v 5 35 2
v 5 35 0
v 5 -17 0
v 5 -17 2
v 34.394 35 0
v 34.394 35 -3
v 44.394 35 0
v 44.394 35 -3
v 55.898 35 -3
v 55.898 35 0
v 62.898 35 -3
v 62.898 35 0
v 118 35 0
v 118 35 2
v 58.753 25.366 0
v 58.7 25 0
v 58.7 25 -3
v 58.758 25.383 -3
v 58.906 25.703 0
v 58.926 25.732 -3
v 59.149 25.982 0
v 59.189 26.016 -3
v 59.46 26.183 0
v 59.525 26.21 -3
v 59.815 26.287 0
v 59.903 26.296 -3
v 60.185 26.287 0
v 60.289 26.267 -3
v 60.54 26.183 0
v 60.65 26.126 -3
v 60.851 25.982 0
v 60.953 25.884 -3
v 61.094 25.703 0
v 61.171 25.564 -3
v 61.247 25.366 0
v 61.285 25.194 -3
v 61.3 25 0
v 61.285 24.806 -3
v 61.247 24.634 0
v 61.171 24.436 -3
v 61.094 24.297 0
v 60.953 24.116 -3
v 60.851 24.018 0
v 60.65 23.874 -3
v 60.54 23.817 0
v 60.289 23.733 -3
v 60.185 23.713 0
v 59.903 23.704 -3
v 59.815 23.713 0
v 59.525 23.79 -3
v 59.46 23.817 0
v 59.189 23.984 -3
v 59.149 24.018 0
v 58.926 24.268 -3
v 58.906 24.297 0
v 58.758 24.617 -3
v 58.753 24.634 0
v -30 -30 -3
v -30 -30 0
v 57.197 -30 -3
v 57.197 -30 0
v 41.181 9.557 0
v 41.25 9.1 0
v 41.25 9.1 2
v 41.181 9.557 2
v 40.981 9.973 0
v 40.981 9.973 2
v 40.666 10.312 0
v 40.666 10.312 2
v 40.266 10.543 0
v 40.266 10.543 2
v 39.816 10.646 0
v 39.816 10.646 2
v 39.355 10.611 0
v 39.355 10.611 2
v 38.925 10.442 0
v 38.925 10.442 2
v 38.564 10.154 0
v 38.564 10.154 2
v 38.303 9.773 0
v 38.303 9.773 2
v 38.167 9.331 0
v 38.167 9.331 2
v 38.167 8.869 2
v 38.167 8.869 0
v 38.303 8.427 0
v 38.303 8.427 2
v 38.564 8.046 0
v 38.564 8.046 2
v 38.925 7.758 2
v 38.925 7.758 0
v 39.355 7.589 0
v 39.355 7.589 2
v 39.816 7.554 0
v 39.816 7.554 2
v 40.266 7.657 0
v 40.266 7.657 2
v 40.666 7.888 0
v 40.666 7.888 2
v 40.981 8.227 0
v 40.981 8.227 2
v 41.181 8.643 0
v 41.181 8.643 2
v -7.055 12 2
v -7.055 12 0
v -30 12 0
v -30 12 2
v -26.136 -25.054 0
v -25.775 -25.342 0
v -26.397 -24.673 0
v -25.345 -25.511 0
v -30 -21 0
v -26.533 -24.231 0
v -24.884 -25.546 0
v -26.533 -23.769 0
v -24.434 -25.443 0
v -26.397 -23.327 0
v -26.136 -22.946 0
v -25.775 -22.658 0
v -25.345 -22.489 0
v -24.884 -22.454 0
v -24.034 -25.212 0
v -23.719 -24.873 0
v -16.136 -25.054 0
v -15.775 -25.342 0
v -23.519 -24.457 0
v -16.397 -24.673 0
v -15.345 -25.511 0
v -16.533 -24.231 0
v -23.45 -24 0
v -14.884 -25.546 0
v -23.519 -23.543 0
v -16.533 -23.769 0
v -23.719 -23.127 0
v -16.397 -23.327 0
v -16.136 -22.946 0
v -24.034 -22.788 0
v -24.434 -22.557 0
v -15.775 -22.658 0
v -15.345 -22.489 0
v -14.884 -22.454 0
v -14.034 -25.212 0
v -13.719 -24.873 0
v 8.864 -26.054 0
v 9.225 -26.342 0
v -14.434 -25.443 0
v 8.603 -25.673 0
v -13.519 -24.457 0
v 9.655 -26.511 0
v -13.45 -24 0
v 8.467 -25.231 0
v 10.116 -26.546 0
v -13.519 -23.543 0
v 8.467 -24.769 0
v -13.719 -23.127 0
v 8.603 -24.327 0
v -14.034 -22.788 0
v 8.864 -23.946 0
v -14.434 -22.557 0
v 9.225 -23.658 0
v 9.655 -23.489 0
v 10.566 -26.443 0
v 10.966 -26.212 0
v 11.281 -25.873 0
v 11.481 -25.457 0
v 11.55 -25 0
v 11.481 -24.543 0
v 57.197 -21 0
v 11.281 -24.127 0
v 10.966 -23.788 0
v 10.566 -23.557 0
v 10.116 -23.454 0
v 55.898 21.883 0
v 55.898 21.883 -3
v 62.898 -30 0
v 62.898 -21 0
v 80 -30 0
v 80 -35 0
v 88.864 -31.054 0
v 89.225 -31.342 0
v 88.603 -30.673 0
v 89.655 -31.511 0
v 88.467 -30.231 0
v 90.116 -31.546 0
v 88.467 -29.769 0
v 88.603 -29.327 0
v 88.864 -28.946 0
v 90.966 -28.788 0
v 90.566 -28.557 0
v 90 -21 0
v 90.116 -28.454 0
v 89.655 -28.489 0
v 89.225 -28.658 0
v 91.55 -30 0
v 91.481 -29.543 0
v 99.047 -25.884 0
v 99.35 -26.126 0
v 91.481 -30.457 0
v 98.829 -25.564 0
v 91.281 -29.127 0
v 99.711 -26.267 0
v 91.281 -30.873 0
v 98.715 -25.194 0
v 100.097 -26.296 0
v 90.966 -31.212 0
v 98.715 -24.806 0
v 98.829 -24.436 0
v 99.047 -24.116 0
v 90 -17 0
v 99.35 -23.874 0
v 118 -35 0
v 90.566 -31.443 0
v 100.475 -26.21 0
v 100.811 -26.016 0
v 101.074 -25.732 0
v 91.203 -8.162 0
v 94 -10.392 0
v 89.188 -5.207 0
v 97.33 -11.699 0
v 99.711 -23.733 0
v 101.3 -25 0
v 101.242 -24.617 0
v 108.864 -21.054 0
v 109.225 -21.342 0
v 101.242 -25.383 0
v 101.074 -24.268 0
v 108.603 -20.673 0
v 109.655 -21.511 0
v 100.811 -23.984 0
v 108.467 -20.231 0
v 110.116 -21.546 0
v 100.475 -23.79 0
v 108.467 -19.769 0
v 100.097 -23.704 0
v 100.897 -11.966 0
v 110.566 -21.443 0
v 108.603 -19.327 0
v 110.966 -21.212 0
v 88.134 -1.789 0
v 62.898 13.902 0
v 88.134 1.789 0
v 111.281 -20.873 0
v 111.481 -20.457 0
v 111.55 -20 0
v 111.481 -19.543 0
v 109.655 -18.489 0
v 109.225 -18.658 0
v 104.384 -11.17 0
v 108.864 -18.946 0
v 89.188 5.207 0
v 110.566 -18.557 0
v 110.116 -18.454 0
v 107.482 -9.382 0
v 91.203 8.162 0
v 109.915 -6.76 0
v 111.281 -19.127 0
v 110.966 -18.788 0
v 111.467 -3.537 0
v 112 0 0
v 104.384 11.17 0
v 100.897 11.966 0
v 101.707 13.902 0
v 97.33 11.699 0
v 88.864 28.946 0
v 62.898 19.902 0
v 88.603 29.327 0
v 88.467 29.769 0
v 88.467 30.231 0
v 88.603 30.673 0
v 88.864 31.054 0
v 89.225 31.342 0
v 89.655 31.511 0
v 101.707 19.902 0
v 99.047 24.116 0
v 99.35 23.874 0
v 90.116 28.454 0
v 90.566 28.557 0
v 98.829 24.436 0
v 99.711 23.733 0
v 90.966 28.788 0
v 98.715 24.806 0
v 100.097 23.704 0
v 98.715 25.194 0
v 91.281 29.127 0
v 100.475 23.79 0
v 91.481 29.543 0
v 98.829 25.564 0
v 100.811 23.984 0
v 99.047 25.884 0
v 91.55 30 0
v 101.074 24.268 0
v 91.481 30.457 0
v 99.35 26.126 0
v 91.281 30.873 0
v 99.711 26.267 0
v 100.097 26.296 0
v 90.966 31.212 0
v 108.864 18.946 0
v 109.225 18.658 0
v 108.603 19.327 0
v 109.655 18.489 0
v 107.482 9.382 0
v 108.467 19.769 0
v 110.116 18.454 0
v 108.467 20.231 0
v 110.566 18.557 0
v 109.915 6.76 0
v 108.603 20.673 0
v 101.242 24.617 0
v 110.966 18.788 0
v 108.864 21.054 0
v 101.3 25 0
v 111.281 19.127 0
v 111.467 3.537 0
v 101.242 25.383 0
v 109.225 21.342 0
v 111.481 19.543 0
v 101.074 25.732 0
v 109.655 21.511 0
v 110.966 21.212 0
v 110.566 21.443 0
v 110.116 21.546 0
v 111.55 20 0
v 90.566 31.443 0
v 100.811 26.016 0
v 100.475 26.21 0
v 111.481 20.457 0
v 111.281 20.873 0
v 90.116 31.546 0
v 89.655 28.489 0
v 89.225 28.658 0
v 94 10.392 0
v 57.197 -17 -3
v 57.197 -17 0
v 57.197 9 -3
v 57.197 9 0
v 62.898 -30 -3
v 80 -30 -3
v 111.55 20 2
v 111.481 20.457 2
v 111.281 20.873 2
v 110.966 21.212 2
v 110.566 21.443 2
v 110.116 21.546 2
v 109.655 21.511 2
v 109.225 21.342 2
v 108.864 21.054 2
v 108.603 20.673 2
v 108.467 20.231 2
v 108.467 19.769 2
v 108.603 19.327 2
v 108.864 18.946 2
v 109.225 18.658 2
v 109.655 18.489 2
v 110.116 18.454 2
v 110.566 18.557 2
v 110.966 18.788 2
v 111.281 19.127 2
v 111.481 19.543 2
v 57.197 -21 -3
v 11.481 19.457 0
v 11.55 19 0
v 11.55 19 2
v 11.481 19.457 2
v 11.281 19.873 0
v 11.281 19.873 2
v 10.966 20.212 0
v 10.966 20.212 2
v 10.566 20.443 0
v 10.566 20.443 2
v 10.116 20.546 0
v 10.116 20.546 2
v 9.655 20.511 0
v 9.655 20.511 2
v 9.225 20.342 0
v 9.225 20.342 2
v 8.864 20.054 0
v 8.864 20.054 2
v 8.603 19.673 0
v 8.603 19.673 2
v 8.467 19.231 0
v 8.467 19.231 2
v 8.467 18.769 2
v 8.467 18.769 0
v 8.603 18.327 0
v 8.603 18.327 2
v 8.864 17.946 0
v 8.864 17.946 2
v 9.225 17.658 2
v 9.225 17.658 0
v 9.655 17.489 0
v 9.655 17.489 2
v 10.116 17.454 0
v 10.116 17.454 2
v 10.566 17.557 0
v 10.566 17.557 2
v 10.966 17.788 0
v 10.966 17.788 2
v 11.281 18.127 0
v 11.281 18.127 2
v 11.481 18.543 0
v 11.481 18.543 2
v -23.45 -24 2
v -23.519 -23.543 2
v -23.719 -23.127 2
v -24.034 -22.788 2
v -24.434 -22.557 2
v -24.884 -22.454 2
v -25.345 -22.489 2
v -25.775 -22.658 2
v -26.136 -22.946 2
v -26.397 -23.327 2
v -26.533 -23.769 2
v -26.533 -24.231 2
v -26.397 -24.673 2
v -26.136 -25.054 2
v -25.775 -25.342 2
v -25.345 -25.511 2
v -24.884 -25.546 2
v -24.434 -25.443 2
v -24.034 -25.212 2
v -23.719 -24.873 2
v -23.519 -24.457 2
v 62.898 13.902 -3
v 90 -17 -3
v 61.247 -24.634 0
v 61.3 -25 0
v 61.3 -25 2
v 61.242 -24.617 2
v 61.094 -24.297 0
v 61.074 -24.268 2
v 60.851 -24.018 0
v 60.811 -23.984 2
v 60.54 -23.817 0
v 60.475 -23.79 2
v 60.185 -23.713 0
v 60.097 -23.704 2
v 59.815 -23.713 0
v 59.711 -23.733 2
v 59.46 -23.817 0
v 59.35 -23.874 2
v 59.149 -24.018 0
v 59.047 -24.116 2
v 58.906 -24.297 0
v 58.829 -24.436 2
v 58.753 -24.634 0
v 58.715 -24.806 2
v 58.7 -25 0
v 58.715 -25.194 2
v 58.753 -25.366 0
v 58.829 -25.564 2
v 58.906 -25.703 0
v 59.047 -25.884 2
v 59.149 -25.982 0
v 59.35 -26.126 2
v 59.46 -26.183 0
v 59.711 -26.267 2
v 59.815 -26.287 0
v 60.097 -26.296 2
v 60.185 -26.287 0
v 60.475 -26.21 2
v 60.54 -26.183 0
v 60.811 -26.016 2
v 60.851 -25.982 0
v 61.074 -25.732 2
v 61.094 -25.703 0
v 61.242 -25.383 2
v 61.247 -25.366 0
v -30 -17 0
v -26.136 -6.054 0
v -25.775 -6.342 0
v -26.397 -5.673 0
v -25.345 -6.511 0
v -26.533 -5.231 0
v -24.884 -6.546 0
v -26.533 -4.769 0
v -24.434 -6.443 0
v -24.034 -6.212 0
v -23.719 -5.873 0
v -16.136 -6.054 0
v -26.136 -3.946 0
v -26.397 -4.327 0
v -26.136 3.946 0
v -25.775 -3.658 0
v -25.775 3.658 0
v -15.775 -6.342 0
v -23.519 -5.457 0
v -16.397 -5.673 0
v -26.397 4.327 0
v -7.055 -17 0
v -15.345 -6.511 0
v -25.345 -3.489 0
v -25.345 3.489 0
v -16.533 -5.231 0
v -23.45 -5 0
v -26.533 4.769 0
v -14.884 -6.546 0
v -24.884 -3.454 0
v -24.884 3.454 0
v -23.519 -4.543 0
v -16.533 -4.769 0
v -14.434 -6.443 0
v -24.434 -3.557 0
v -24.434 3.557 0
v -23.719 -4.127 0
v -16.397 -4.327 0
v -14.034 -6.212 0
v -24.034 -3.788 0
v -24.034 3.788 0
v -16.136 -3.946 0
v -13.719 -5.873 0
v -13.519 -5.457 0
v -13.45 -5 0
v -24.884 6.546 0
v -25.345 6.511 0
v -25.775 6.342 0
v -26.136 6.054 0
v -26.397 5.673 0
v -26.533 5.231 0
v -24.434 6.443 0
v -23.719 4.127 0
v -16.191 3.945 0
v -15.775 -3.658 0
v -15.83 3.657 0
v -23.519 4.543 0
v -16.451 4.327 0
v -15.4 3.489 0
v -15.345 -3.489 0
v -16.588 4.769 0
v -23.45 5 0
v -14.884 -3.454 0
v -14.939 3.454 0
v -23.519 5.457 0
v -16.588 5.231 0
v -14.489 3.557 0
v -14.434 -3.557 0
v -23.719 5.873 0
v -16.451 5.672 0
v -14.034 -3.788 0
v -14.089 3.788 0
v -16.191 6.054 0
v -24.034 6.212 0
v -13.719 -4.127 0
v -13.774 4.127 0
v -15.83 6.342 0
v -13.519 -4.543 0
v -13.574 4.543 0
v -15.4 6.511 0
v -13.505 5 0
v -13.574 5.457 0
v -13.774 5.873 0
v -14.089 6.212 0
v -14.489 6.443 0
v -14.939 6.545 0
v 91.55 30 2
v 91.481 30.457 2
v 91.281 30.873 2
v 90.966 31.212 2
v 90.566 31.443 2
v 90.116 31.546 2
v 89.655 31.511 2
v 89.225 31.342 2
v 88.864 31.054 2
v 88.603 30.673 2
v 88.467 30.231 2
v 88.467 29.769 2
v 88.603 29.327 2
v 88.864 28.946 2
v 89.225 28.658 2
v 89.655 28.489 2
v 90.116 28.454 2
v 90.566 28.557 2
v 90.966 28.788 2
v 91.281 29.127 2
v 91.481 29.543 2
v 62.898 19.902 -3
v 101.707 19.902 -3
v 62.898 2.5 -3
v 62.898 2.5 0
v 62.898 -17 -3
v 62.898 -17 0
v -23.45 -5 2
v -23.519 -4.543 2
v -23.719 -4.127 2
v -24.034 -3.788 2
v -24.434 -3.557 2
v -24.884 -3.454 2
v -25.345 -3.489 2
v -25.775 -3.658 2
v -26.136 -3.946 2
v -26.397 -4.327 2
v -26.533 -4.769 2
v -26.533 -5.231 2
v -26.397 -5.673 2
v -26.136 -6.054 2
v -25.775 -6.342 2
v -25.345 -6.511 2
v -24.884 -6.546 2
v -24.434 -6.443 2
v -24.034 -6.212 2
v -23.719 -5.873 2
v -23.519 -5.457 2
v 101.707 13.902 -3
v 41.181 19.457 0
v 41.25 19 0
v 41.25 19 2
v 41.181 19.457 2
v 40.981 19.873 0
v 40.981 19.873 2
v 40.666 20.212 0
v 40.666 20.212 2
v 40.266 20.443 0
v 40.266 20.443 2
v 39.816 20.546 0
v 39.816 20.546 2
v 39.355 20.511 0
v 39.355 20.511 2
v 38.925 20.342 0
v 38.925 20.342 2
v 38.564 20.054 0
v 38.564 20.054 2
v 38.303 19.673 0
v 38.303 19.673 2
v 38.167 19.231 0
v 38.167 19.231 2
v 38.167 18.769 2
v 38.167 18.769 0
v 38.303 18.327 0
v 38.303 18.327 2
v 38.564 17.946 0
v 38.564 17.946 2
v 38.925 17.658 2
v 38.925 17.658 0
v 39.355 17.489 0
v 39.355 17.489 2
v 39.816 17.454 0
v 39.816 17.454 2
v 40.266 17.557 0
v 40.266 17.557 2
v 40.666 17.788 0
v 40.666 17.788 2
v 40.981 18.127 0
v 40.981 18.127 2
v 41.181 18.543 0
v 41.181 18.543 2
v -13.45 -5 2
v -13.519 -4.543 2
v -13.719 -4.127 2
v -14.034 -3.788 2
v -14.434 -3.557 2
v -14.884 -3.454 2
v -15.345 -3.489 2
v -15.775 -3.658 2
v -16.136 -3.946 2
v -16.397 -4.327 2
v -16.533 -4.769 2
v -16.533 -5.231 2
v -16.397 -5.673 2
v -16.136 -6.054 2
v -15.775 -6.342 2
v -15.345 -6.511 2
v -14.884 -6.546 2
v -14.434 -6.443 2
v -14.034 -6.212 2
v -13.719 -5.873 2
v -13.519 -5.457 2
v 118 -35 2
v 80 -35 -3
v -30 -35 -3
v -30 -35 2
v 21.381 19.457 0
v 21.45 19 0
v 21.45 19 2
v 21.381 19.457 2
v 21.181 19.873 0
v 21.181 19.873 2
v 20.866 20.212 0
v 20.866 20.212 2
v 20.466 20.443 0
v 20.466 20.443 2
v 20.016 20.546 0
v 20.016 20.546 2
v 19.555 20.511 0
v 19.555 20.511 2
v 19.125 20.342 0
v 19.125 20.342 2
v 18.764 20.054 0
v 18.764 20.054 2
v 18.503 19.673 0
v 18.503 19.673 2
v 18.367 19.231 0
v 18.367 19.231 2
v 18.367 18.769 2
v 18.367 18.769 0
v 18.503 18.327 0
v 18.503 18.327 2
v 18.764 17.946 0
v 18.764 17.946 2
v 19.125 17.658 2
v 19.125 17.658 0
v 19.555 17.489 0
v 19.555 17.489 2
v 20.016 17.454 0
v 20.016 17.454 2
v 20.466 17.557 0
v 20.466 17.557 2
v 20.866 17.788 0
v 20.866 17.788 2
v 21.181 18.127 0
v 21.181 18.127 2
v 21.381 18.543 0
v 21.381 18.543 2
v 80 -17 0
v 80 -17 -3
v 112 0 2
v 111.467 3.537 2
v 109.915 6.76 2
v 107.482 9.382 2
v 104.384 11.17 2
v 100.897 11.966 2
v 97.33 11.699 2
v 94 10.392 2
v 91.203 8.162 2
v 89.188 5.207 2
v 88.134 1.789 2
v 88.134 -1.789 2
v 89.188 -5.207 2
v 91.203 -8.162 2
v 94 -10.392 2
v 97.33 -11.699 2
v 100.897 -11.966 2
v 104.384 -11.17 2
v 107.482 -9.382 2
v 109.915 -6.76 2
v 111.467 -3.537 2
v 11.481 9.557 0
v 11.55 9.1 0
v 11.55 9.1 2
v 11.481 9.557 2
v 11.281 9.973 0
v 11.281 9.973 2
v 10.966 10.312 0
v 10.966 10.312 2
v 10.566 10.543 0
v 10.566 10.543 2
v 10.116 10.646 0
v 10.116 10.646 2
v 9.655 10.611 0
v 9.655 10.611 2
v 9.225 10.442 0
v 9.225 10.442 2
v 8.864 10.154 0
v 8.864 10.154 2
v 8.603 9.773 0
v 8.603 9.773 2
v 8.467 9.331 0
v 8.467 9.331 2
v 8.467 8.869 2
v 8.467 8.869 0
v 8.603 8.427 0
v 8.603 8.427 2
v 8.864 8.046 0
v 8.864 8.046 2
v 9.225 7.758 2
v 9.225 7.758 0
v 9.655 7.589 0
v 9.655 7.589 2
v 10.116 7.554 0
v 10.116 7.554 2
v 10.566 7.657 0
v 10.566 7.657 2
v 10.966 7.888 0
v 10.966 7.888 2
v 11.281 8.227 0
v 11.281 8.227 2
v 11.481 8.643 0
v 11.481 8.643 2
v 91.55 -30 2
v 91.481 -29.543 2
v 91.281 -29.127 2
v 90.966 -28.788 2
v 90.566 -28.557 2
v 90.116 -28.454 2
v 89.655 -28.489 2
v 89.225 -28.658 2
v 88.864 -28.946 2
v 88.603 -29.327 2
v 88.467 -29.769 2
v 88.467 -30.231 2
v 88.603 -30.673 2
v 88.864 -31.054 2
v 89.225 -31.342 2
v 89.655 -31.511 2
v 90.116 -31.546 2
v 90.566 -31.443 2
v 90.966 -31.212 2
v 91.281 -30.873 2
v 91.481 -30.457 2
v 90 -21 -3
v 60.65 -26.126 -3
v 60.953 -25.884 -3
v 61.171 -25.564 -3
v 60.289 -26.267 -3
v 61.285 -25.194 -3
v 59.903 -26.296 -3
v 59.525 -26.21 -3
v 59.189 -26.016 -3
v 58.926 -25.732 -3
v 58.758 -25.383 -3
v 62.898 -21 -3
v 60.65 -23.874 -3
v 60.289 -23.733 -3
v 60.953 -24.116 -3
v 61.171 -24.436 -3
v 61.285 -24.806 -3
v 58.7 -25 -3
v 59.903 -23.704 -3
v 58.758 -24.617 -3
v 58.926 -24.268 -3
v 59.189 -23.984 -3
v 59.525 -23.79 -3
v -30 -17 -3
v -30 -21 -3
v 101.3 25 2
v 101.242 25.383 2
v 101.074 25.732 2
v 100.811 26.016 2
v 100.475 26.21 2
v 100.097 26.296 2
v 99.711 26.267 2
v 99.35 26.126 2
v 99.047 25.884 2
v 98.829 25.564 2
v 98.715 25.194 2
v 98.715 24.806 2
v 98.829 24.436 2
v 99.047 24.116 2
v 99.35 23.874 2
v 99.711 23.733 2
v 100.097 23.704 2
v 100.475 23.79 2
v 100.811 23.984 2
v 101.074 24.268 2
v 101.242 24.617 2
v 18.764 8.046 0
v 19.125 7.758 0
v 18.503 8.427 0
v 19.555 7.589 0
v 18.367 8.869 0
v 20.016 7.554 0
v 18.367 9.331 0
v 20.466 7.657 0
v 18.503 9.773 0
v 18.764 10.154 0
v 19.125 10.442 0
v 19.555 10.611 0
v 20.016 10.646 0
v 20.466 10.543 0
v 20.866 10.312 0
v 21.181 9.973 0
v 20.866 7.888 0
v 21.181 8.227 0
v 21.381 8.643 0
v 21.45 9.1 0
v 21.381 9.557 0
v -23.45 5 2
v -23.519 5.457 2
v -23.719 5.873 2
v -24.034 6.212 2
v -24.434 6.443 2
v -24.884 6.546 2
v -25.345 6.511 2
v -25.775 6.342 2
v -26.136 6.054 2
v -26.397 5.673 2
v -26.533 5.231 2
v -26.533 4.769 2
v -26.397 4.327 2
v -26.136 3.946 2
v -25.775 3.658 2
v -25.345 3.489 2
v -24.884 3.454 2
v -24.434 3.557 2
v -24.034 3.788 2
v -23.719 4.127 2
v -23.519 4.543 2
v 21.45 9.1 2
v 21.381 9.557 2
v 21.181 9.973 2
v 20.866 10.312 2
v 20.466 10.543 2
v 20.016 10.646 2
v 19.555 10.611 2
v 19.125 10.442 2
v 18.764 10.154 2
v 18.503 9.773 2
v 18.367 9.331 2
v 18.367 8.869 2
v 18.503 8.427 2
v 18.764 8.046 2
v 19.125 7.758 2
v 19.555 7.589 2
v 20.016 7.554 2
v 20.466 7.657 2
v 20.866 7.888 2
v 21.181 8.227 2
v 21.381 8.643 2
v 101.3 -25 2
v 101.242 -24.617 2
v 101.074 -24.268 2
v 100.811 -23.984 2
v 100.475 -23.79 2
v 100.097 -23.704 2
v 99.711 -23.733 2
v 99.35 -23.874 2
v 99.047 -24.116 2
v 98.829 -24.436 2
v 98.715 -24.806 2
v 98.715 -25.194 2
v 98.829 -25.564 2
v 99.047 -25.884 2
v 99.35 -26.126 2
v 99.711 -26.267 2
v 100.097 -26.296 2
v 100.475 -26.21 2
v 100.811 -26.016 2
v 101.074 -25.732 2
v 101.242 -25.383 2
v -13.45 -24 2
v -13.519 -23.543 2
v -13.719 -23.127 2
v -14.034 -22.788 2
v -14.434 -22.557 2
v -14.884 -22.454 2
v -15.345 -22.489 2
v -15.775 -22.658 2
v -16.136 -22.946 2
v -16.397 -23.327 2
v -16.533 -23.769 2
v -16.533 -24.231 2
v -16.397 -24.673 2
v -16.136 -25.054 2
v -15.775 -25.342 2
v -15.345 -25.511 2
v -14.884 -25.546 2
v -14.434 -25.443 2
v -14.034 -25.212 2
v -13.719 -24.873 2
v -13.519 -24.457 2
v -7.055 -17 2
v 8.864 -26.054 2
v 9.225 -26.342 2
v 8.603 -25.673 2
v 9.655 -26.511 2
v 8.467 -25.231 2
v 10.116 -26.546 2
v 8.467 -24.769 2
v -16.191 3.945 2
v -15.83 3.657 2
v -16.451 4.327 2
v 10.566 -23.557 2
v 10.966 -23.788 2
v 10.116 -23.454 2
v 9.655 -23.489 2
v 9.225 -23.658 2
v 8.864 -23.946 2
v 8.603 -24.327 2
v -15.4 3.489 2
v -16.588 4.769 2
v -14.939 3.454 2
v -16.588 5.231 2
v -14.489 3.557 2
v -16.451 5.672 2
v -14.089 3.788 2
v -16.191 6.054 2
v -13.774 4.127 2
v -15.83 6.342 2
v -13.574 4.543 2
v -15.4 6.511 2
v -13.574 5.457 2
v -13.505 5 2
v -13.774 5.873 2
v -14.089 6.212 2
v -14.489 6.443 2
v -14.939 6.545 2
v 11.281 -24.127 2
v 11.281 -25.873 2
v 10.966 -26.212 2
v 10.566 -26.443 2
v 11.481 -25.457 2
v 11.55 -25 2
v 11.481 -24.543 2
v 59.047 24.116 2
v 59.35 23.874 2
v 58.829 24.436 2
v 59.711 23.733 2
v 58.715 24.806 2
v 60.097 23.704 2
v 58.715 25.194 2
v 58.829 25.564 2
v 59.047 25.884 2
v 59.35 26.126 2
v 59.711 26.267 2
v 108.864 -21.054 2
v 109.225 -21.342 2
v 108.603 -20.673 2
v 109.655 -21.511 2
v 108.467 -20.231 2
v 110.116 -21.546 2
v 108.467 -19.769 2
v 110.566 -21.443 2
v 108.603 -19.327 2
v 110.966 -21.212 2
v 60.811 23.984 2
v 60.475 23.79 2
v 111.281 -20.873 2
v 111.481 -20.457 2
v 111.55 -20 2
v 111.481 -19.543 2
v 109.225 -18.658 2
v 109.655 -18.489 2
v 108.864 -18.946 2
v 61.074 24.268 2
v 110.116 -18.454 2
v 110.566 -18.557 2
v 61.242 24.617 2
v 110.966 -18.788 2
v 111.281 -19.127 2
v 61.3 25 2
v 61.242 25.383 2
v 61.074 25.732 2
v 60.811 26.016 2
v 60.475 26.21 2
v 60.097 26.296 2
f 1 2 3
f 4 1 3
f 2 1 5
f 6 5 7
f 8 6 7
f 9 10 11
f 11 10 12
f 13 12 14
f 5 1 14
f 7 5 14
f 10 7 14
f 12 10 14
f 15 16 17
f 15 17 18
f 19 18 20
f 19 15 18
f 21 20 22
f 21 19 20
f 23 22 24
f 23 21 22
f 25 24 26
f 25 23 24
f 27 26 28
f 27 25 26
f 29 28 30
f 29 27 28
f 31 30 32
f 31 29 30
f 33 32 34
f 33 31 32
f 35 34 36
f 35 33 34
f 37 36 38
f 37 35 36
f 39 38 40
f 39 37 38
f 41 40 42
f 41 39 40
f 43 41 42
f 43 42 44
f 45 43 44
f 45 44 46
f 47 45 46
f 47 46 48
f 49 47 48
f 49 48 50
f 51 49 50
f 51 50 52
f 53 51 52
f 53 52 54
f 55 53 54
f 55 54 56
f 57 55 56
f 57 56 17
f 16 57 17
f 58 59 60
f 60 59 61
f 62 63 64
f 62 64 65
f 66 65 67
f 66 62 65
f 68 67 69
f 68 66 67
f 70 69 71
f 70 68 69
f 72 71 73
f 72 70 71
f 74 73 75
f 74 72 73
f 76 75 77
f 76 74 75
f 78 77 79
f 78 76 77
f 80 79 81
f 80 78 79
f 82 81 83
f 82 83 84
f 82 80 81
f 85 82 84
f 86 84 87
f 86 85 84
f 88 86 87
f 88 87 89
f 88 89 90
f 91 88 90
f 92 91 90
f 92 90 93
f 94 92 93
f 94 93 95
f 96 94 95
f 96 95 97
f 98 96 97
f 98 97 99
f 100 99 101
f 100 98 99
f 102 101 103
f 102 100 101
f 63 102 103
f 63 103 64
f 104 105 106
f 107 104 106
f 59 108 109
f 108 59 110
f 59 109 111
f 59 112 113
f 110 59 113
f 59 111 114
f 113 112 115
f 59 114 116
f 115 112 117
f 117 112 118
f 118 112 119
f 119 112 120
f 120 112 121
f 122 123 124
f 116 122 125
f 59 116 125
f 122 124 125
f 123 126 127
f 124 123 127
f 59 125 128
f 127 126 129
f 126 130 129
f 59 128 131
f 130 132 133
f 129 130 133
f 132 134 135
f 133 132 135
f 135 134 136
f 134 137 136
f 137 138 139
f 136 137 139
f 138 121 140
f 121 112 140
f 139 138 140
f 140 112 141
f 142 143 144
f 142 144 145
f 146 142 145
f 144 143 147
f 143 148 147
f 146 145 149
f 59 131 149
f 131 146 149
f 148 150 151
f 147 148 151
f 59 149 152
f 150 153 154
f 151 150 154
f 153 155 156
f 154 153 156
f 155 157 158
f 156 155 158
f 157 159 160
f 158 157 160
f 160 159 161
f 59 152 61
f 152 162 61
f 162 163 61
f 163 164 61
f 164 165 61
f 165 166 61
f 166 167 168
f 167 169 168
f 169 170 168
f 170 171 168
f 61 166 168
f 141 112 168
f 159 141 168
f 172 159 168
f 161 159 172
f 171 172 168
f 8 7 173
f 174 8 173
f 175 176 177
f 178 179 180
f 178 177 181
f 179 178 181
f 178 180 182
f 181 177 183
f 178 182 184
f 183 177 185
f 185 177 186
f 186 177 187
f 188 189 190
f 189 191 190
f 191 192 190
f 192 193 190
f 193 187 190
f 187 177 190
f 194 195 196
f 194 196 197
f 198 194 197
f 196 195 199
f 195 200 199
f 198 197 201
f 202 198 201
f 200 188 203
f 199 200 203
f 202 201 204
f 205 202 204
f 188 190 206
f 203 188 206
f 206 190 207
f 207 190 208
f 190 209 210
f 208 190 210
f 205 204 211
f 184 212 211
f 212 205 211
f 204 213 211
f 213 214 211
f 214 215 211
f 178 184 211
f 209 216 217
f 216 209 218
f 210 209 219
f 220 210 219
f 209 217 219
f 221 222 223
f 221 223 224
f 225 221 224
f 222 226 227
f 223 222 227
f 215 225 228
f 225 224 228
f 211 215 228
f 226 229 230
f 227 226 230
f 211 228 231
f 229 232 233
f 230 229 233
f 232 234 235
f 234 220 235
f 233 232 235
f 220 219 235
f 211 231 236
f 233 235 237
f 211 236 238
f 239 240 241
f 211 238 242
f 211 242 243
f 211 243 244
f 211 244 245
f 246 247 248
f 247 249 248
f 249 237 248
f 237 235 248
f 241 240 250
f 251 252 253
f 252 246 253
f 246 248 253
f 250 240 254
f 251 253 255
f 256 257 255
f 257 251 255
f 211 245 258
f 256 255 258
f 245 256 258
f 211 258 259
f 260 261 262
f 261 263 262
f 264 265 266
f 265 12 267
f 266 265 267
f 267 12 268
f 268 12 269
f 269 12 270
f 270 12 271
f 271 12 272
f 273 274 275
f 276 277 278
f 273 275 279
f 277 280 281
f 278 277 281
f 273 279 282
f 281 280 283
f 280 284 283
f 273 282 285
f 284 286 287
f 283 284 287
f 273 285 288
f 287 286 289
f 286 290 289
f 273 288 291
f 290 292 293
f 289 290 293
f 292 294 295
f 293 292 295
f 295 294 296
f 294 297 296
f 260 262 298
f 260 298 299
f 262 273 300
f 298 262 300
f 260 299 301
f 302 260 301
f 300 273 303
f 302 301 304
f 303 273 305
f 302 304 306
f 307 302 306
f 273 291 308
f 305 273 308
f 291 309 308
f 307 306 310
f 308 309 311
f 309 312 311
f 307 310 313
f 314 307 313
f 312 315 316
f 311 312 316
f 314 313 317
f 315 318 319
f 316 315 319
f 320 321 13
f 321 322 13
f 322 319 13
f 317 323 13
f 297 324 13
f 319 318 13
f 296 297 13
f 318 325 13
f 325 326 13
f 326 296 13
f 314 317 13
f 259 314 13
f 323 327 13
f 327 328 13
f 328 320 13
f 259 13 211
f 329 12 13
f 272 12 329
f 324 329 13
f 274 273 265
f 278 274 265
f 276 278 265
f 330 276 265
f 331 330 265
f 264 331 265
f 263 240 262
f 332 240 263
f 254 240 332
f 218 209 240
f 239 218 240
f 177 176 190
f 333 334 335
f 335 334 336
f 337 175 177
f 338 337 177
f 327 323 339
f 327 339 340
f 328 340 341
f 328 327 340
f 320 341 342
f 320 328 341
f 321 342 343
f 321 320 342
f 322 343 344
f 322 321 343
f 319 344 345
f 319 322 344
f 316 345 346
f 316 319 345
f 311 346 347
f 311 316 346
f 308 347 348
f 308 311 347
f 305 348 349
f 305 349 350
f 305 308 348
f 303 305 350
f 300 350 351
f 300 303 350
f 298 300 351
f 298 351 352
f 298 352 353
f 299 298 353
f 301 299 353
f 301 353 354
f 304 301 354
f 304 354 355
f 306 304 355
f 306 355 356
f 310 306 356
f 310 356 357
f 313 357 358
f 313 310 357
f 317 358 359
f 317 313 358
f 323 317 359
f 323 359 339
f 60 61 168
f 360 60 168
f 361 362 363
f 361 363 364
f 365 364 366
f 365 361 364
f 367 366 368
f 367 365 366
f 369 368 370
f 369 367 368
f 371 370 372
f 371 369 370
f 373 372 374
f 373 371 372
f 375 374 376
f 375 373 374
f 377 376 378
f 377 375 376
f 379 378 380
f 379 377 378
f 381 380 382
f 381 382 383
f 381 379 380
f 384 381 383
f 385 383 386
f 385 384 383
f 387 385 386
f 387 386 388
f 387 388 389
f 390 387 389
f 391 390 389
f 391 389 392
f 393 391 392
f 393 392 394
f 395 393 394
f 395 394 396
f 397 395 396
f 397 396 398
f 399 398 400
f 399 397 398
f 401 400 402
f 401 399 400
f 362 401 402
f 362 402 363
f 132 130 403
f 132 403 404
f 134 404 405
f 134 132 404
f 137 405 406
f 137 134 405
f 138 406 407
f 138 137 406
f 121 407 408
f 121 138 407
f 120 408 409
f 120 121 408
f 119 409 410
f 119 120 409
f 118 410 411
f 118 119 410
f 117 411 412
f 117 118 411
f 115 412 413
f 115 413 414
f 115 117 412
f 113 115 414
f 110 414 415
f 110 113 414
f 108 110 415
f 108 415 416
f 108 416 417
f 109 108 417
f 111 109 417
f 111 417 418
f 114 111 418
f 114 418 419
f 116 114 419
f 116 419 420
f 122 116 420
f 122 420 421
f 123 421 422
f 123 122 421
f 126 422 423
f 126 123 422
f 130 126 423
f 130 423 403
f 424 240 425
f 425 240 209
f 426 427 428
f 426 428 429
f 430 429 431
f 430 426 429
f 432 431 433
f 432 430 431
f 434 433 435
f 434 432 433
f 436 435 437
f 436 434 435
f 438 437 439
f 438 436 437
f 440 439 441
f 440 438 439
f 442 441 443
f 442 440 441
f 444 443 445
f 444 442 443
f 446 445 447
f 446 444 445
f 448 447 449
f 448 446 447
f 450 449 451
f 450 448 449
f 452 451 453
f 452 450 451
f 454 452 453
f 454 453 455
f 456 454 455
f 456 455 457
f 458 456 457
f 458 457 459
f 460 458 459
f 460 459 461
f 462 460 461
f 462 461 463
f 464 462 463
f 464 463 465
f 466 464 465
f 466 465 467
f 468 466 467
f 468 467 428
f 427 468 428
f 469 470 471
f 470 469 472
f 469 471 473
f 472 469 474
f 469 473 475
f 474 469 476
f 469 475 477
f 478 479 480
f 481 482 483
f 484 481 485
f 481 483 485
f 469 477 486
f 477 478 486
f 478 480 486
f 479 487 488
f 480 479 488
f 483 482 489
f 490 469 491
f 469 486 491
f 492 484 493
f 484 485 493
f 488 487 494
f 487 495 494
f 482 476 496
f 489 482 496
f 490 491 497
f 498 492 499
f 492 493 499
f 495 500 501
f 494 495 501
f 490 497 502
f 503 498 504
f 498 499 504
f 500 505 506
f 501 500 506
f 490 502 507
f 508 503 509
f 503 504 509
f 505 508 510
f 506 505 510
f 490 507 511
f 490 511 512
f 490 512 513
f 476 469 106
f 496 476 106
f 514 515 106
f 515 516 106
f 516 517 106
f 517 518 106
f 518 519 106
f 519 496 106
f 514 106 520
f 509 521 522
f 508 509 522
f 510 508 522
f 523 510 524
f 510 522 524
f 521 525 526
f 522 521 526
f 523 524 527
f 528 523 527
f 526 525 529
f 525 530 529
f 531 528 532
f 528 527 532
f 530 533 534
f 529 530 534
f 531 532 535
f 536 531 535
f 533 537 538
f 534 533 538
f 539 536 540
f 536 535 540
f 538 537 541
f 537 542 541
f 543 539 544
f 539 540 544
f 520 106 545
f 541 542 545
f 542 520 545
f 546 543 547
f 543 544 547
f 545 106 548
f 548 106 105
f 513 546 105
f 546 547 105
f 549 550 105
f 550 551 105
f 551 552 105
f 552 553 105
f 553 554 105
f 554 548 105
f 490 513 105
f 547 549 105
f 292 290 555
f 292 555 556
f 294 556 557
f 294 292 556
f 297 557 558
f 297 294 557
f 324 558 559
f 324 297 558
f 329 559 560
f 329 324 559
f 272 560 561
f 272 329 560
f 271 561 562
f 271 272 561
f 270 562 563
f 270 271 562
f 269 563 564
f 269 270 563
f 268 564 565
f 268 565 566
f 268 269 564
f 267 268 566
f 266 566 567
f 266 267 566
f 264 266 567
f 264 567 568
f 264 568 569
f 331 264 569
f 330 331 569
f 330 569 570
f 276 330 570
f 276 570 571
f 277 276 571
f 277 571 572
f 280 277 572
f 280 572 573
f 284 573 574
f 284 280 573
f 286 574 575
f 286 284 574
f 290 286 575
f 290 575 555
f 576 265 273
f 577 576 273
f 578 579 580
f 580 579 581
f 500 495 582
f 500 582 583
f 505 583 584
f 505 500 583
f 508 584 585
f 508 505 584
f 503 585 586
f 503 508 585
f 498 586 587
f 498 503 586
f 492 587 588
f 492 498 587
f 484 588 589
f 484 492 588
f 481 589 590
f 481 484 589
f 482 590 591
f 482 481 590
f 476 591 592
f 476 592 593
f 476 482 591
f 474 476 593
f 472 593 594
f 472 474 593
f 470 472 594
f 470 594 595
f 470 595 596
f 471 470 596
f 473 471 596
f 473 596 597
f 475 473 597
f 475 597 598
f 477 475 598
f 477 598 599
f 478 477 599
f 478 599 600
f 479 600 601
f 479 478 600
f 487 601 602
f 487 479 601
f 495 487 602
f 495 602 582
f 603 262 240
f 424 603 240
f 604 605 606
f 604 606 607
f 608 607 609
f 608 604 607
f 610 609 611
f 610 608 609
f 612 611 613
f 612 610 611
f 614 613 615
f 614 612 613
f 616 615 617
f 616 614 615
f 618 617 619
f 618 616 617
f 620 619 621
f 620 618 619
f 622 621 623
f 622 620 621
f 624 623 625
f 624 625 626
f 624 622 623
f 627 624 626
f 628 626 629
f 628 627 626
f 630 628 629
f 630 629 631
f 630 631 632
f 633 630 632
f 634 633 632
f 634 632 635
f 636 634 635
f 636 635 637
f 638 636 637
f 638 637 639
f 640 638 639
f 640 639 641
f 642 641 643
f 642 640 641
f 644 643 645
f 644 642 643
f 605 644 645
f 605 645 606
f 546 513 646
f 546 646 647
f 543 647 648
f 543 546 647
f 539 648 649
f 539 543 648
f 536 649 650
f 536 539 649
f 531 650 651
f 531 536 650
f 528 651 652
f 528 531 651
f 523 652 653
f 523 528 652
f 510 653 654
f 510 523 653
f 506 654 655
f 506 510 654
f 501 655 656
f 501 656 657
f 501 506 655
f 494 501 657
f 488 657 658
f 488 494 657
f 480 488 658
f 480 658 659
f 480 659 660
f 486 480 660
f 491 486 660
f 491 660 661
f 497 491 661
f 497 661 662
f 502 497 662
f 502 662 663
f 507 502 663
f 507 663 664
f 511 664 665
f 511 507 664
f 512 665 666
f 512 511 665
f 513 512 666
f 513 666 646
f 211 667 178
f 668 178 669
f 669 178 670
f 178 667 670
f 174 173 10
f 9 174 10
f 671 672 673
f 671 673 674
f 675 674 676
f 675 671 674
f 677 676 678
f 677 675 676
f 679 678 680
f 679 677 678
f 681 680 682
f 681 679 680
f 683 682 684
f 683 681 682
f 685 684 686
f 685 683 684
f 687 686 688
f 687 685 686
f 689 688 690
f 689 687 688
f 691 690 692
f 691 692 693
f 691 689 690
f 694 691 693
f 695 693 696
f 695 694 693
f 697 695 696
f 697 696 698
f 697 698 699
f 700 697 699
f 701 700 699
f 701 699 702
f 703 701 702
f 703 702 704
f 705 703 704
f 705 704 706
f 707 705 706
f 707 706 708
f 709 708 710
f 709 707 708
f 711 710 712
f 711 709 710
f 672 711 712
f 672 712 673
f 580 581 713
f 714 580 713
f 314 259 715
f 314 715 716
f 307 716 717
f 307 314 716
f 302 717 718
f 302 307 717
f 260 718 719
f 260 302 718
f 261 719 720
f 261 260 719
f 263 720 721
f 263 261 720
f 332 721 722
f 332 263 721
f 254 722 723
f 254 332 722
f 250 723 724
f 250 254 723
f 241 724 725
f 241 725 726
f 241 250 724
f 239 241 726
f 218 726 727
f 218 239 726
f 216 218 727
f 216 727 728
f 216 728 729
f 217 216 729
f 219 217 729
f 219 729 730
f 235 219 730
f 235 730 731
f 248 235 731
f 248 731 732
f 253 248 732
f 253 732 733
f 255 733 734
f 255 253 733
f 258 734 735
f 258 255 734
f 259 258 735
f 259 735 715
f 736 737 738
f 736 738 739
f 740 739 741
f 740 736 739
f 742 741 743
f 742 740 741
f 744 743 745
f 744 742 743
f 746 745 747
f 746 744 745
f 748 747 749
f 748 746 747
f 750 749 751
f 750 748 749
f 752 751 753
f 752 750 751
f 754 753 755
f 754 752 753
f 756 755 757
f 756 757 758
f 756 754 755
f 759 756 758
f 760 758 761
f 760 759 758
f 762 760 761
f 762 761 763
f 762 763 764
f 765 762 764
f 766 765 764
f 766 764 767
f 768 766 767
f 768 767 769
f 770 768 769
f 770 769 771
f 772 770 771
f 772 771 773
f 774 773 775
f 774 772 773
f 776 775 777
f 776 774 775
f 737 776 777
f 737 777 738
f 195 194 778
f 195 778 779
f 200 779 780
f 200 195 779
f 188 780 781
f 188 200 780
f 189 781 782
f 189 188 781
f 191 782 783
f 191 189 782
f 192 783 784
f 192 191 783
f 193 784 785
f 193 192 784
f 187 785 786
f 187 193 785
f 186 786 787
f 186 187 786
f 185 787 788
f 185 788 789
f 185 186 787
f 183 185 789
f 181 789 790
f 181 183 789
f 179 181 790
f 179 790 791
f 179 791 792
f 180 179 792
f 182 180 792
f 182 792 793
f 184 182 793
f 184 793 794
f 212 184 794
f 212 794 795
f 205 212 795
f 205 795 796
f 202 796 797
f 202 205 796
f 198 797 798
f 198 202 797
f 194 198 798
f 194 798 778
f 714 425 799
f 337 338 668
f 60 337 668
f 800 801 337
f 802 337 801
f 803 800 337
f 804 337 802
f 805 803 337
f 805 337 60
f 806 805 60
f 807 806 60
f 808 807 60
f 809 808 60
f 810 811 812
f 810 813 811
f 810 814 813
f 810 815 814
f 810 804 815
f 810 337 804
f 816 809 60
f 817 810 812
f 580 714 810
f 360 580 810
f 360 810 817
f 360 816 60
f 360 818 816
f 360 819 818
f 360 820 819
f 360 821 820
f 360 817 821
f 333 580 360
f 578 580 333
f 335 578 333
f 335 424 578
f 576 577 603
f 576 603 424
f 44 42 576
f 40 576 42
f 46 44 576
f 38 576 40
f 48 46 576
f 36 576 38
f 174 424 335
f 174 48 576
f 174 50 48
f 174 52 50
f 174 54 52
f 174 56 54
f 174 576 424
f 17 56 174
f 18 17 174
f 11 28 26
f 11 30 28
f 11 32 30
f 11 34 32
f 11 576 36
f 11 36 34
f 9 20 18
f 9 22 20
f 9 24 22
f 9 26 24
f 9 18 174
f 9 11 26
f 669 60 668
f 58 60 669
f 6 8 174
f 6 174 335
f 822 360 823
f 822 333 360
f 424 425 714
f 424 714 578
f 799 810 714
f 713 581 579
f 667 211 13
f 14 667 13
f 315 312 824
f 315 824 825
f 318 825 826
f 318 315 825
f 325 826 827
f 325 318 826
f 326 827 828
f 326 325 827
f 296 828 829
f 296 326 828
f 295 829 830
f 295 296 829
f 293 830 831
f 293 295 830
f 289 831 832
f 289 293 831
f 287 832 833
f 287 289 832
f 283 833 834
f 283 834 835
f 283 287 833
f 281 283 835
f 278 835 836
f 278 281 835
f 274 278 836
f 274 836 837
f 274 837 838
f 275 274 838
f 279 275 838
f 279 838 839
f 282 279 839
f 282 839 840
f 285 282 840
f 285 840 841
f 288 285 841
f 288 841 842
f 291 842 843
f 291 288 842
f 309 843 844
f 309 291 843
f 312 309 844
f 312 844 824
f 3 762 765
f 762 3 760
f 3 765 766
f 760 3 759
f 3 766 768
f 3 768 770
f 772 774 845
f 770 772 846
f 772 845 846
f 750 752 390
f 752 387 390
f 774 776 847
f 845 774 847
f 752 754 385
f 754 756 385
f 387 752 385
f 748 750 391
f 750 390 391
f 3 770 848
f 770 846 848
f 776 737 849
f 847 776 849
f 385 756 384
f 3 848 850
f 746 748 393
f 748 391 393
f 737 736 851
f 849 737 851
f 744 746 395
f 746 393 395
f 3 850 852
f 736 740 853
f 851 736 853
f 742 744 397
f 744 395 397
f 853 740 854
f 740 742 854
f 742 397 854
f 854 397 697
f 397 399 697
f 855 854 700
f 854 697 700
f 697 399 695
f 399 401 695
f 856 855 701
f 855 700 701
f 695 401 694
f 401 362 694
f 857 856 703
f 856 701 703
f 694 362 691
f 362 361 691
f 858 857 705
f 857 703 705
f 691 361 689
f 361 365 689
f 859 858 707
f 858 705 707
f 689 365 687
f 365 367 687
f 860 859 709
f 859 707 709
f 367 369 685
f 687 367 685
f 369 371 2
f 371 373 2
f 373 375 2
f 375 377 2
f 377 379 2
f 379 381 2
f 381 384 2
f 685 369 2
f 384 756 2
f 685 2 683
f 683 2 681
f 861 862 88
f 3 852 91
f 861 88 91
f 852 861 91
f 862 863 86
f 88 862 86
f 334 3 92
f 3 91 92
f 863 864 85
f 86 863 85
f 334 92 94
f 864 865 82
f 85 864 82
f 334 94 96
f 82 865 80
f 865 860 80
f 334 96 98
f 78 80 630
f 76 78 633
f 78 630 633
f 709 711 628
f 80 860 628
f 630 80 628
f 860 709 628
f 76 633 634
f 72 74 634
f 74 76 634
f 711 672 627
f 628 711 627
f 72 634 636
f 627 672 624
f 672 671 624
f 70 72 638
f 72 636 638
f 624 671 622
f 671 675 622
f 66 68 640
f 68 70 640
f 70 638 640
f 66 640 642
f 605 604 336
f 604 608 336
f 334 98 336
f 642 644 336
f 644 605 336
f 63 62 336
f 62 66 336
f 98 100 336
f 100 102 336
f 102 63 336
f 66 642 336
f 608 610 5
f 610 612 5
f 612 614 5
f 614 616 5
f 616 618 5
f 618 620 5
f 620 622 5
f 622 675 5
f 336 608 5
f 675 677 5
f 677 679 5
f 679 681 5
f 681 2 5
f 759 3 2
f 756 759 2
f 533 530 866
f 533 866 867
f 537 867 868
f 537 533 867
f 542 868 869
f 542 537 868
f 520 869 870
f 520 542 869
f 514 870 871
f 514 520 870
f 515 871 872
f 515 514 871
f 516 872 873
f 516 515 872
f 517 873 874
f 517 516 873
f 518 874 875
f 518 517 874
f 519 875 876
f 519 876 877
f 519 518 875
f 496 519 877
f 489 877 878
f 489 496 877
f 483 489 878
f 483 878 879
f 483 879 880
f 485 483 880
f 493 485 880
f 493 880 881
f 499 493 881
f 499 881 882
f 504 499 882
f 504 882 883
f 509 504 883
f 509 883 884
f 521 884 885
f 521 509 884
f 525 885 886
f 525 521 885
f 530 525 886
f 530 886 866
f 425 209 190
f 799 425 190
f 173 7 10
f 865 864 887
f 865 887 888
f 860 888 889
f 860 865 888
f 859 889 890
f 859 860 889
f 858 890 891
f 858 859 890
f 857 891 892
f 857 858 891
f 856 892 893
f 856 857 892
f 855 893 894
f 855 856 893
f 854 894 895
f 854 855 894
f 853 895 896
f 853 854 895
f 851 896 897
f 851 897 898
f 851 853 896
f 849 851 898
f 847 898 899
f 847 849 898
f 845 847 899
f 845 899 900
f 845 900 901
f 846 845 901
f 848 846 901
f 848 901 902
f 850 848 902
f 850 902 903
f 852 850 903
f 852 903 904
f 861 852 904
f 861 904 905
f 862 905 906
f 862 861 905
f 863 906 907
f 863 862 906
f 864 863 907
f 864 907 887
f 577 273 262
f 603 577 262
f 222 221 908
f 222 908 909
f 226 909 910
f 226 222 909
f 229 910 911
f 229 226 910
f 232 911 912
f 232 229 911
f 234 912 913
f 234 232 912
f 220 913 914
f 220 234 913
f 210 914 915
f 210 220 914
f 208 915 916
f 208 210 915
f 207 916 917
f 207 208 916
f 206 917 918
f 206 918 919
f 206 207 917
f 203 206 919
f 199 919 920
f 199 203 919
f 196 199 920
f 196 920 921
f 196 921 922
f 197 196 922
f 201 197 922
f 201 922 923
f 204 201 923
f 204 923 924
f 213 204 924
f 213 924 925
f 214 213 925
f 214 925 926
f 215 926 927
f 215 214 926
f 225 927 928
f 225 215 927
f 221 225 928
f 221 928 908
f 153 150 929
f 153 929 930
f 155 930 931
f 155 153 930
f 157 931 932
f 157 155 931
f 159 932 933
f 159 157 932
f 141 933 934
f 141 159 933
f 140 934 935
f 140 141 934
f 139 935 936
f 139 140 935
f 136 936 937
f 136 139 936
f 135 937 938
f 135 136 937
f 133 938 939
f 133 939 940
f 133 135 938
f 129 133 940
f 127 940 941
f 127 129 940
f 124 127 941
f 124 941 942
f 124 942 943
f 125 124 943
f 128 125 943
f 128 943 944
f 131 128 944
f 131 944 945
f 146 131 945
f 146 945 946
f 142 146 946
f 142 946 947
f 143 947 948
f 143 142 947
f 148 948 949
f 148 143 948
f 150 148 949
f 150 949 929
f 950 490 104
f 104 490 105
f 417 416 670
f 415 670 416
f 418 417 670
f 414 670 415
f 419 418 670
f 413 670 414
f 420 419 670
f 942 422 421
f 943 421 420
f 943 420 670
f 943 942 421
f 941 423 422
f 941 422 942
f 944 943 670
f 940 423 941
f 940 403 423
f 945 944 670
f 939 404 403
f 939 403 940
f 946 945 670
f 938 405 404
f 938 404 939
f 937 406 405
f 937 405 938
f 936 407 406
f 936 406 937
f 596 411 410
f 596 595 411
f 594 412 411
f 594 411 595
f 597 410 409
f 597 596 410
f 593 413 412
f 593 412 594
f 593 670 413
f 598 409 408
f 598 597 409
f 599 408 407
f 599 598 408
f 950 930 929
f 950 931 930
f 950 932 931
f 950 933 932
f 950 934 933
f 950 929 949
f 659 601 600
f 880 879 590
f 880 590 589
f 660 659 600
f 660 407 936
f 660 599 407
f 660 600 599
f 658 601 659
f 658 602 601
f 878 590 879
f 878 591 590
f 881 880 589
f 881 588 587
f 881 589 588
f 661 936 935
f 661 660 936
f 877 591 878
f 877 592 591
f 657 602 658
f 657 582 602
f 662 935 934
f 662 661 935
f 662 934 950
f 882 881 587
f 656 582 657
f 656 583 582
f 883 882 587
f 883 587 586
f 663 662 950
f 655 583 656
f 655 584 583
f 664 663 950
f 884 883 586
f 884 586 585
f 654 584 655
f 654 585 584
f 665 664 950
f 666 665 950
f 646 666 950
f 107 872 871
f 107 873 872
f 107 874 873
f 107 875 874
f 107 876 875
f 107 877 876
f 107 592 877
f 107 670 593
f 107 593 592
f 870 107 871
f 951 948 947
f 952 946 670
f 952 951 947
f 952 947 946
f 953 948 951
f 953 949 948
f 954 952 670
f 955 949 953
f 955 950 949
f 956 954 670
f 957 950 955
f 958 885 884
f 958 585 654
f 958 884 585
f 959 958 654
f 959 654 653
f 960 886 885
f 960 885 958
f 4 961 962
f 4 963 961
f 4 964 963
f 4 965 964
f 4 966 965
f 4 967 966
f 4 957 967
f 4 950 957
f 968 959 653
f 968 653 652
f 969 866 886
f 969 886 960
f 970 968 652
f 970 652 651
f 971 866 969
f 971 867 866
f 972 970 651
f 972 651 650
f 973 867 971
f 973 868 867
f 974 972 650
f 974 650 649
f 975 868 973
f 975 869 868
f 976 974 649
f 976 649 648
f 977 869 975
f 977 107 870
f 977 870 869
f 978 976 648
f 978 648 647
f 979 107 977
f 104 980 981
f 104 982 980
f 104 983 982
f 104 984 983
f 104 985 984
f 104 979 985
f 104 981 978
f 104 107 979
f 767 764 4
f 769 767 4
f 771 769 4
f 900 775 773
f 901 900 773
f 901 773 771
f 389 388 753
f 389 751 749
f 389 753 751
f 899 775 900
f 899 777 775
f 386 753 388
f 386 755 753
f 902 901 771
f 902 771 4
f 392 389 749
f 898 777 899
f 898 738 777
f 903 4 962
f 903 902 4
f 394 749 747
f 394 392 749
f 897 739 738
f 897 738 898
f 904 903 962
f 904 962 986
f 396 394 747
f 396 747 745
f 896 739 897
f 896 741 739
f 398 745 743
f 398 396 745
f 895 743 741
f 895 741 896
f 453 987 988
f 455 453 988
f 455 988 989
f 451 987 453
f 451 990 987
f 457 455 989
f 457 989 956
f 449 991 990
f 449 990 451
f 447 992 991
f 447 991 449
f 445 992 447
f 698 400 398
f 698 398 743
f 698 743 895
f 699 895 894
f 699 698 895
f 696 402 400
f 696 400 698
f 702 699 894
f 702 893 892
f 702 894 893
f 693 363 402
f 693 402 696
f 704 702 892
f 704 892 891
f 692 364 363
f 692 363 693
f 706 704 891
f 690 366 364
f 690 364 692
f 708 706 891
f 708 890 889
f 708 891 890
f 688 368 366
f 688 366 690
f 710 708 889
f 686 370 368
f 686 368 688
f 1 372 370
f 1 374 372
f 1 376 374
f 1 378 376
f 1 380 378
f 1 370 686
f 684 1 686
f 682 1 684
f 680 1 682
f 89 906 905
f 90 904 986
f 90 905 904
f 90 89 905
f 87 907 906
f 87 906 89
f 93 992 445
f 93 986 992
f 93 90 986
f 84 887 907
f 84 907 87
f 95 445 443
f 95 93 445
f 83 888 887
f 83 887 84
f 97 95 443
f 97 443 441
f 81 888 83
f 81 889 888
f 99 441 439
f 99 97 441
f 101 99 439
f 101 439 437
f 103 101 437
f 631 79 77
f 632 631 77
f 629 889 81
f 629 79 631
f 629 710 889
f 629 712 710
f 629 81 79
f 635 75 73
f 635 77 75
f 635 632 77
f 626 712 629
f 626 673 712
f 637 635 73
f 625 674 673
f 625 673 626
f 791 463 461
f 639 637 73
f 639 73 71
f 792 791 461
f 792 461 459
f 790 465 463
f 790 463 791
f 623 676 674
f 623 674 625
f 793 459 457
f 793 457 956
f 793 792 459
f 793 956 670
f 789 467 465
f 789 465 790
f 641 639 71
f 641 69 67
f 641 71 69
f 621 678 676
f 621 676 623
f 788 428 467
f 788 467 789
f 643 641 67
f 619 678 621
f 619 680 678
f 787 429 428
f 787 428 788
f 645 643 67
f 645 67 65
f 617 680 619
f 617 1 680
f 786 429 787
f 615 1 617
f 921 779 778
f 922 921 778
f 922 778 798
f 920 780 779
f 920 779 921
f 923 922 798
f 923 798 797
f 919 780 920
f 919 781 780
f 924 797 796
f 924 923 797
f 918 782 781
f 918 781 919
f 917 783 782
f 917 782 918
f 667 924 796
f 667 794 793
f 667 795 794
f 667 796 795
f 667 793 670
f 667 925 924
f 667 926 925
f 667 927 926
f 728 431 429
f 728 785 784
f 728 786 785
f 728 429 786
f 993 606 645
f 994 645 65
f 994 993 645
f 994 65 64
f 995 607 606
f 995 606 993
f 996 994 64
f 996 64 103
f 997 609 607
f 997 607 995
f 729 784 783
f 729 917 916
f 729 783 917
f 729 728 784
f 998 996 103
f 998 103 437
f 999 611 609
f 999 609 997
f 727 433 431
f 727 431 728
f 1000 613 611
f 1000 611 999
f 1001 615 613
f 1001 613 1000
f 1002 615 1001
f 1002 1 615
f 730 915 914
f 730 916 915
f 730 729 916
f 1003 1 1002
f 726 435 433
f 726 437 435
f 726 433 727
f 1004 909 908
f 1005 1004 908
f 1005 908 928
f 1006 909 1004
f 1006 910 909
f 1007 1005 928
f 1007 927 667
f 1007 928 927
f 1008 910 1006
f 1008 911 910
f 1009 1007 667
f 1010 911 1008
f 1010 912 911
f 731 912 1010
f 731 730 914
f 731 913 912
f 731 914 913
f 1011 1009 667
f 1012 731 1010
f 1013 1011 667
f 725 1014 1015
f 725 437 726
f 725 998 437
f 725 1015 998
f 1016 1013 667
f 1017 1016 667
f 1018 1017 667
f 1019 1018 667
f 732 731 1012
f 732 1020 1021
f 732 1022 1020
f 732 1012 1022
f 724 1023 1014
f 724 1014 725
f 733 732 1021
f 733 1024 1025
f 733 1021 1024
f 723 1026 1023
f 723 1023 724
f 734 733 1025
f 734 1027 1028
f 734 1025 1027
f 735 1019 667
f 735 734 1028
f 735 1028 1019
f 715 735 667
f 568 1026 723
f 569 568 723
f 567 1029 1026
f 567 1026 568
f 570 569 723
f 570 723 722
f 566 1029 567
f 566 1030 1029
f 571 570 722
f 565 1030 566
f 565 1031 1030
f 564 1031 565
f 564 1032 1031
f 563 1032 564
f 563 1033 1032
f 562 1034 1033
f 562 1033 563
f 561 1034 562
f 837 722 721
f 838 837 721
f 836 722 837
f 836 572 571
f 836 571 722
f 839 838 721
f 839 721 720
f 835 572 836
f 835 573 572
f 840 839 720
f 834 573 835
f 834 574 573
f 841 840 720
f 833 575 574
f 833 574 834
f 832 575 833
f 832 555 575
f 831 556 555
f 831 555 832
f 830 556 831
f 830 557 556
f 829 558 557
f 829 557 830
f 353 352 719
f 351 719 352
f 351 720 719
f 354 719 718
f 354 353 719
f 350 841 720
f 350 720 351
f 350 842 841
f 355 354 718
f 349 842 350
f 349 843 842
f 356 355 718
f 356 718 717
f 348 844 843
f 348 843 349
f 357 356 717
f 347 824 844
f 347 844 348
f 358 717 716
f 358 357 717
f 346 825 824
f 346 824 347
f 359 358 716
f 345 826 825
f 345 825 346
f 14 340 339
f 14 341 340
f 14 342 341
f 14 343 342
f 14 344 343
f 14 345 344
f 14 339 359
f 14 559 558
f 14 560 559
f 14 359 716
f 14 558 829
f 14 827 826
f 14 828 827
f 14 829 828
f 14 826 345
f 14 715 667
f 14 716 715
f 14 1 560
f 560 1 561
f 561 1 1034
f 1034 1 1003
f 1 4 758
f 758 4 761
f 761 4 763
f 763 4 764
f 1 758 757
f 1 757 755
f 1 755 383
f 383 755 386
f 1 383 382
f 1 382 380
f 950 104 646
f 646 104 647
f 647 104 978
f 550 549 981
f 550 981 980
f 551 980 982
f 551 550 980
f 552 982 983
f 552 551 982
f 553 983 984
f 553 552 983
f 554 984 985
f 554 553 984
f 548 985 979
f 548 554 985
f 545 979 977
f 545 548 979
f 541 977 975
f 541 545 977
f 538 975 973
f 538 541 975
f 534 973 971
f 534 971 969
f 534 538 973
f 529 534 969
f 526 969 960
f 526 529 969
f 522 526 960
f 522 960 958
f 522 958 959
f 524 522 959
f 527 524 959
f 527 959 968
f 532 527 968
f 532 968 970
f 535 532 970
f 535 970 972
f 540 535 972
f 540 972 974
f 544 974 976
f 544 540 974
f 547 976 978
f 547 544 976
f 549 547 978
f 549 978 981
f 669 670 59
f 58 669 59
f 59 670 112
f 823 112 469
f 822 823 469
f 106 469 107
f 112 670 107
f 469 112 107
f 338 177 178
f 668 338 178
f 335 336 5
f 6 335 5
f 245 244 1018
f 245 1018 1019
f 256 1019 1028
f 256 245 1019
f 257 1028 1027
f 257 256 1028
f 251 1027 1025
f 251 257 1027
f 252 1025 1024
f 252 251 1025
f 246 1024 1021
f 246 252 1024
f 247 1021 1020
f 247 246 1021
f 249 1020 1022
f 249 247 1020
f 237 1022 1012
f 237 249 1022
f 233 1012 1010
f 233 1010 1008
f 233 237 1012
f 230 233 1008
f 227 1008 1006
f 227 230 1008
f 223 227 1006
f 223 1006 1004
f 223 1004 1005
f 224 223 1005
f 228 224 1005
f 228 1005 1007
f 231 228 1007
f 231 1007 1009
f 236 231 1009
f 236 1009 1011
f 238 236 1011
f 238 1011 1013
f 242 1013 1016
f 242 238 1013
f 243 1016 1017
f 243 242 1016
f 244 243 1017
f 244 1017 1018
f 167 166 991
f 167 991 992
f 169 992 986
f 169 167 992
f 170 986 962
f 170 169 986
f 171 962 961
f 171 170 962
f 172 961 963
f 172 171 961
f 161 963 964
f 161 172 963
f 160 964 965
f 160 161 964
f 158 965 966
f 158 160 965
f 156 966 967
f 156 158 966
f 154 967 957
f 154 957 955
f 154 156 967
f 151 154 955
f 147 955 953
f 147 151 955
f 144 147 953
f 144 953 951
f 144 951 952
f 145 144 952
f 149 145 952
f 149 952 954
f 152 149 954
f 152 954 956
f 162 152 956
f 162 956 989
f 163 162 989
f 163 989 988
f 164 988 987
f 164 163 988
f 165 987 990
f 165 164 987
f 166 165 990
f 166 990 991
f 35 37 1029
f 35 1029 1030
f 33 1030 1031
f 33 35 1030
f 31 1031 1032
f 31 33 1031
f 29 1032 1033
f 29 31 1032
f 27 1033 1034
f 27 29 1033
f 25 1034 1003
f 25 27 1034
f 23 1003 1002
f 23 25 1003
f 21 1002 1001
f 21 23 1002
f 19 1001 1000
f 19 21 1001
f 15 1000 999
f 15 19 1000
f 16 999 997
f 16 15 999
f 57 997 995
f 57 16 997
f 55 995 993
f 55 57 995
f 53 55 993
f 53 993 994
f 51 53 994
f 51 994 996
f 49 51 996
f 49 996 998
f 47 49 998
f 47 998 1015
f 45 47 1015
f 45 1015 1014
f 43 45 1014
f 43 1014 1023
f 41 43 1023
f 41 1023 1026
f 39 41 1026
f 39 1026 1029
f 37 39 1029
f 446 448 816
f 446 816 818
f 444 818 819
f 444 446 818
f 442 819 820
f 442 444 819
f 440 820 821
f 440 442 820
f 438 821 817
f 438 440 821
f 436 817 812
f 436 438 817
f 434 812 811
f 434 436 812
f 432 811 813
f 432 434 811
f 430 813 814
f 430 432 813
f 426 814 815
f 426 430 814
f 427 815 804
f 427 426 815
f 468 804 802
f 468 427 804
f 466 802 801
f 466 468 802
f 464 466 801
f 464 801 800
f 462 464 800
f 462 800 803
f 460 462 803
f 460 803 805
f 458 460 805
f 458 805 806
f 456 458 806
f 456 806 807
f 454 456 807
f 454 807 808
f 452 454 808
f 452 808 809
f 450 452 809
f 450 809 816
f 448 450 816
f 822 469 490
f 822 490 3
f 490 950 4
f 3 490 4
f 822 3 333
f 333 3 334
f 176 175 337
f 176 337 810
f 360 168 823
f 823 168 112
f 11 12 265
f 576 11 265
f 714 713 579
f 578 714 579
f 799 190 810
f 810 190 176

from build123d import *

# Parameters (mm, degrees)
SKETCH_1_R      = 1.55
SKETCH_1_R_2    = 1.3
SKETCH_1_R_3    = 12
EXTRUDE_1_DEPTH = 2
SKETCH_2_W      = 5.700941524
SKETCH_2_H      = 9
SKETCH_2_R      = 1.3
EXTRUDE_2_DEPTH = 3


with BuildPart() as part:
    # 草图1 → 凸台-拉伸1 (new body)
    with BuildSketch(Plane.XY):
        Polygon((118, -35), (118, 35), (5, 35), (5, 19), (5, -17), (-7.054941738, -17), (-7.054941738, 4.999698131), (-7.054941738, 11.999849066), (-30, 11.999849066), (-30, -35), (-7.054941738, -35), (17.9, -35), align=None)
        with Locations((-25, -24)):
            Circle(SKETCH_1_R, mode=Mode.SUBTRACT)
        with Locations((-15, -24)):
            Circle(SKETCH_1_R, mode=Mode.SUBTRACT)
        with Locations((10, -25)):
            Circle(SKETCH_1_R, mode=Mode.SUBTRACT)
        with Locations((-25, -5)):
            Circle(SKETCH_1_R, mode=Mode.SUBTRACT)
        with Locations((-15, -5)):
            Circle(SKETCH_1_R, mode=Mode.SUBTRACT)
        with Locations((60, -25)):
            Circle(SKETCH_1_R_2, mode=Mode.SUBTRACT)
        with Locations((90, -30)):
            Circle(SKETCH_1_R, mode=Mode.SUBTRACT)
        with Locations((100, -25)):
            Circle(SKETCH_1_R_2, mode=Mode.SUBTRACT)
        with Locations((110, -20)):
            Circle(SKETCH_1_R, mode=Mode.SUBTRACT)
        with Locations((-25, 5)):
            Circle(SKETCH_1_R, mode=Mode.SUBTRACT)
        with Locations((-15.054941738, 4.999698131)):
            Circle(SKETCH_1_R, mode=Mode.SUBTRACT)
        with Locations((10, 9.1)):
            Circle(SKETCH_1_R, mode=Mode.SUBTRACT)
        with Locations((19.9, 9.1)):
            Circle(SKETCH_1_R, mode=Mode.SUBTRACT)
        with Locations((39.7, 9.1)):
            Circle(SKETCH_1_R, mode=Mode.SUBTRACT)
        with Locations((10, 19)):
            Circle(SKETCH_1_R, mode=Mode.SUBTRACT)
        with Locations((19.9, 19)):
            Circle(SKETCH_1_R, mode=Mode.SUBTRACT)
        with Locations((39.7, 19)):
            Circle(SKETCH_1_R, mode=Mode.SUBTRACT)
        with Locations((100, 0)):
            Circle(SKETCH_1_R_3, mode=Mode.SUBTRACT)
        with Locations((60, 25)):
            Circle(SKETCH_1_R_2, mode=Mode.SUBTRACT)
        with Locations((110, 20)):
            Circle(SKETCH_1_R, mode=Mode.SUBTRACT)
        with Locations((100, 25)):
            Circle(SKETCH_1_R_2, mode=Mode.SUBTRACT)
        with Locations((90, 30)):
            Circle(SKETCH_1_R, mode=Mode.SUBTRACT)
    extrude(amount=EXTRUDE_1_DEPTH)

    # 草图2 → 凸台-拉伸2 (add)
    with BuildSketch(Plane(origin=(0, 0, 0), x_dir=(-1, 0, 0), z_dir=(0, 0, -1))):
        Polygon((-62.898115349, 2.499732073), (-57.197173825, 9), (-34.39434765, 35), (-44.39434765, 35), (-55.898115349, 21.883294295), (-57.635924693, 19.901827498), (-62.898115349, 13.901827498), (-90, -17), (-80, -17), align=None)
        Polygon((30, -21), (30, -17), (7.054941738, -17), (-5, -17), (-57.197173825, -17), (-62.898115349, -17), (-80, -17), (-90, -17), (-90, -21), (-62.898115349, -21), (-57.197173825, -21), align=None)
        Polygon((30, -35), (30, -30), (-57.197173825, -30), (-62.898115349, -30), (-80, -30), (-80, -35), align=None)
        Polygon((-101.707321844, 13.901827498), (-62.898115349, 13.901827498), (-57.635924693, 19.901827498), (-62.898115349, 19.901827498), (-101.707321844, 19.901827498), align=None)
        with Locations((-60.047644587, -25.5)):
            Rectangle(SKETCH_2_W, SKETCH_2_H)
        with Locations((-60, -25)):
            Circle(SKETCH_2_R, mode=Mode.SUBTRACT)
        Polygon((-62.898115349, -17), (-57.197173825, -17), (-57.197173825, 9), (-62.898115349, 2.499732073), align=None)
        Polygon((-57.635924693, 19.901827498), (-55.898115349, 21.883294295), (-55.898115349, 35), (-62.898115349, 35), (-62.898115349, 19.901827498), align=None)
        with Locations((-60, 25)):
            Circle(SKETCH_2_R, mode=Mode.SUBTRACT)
    extrude(amount=EXTRUDE_2_DEPTH)


solid = part.part
